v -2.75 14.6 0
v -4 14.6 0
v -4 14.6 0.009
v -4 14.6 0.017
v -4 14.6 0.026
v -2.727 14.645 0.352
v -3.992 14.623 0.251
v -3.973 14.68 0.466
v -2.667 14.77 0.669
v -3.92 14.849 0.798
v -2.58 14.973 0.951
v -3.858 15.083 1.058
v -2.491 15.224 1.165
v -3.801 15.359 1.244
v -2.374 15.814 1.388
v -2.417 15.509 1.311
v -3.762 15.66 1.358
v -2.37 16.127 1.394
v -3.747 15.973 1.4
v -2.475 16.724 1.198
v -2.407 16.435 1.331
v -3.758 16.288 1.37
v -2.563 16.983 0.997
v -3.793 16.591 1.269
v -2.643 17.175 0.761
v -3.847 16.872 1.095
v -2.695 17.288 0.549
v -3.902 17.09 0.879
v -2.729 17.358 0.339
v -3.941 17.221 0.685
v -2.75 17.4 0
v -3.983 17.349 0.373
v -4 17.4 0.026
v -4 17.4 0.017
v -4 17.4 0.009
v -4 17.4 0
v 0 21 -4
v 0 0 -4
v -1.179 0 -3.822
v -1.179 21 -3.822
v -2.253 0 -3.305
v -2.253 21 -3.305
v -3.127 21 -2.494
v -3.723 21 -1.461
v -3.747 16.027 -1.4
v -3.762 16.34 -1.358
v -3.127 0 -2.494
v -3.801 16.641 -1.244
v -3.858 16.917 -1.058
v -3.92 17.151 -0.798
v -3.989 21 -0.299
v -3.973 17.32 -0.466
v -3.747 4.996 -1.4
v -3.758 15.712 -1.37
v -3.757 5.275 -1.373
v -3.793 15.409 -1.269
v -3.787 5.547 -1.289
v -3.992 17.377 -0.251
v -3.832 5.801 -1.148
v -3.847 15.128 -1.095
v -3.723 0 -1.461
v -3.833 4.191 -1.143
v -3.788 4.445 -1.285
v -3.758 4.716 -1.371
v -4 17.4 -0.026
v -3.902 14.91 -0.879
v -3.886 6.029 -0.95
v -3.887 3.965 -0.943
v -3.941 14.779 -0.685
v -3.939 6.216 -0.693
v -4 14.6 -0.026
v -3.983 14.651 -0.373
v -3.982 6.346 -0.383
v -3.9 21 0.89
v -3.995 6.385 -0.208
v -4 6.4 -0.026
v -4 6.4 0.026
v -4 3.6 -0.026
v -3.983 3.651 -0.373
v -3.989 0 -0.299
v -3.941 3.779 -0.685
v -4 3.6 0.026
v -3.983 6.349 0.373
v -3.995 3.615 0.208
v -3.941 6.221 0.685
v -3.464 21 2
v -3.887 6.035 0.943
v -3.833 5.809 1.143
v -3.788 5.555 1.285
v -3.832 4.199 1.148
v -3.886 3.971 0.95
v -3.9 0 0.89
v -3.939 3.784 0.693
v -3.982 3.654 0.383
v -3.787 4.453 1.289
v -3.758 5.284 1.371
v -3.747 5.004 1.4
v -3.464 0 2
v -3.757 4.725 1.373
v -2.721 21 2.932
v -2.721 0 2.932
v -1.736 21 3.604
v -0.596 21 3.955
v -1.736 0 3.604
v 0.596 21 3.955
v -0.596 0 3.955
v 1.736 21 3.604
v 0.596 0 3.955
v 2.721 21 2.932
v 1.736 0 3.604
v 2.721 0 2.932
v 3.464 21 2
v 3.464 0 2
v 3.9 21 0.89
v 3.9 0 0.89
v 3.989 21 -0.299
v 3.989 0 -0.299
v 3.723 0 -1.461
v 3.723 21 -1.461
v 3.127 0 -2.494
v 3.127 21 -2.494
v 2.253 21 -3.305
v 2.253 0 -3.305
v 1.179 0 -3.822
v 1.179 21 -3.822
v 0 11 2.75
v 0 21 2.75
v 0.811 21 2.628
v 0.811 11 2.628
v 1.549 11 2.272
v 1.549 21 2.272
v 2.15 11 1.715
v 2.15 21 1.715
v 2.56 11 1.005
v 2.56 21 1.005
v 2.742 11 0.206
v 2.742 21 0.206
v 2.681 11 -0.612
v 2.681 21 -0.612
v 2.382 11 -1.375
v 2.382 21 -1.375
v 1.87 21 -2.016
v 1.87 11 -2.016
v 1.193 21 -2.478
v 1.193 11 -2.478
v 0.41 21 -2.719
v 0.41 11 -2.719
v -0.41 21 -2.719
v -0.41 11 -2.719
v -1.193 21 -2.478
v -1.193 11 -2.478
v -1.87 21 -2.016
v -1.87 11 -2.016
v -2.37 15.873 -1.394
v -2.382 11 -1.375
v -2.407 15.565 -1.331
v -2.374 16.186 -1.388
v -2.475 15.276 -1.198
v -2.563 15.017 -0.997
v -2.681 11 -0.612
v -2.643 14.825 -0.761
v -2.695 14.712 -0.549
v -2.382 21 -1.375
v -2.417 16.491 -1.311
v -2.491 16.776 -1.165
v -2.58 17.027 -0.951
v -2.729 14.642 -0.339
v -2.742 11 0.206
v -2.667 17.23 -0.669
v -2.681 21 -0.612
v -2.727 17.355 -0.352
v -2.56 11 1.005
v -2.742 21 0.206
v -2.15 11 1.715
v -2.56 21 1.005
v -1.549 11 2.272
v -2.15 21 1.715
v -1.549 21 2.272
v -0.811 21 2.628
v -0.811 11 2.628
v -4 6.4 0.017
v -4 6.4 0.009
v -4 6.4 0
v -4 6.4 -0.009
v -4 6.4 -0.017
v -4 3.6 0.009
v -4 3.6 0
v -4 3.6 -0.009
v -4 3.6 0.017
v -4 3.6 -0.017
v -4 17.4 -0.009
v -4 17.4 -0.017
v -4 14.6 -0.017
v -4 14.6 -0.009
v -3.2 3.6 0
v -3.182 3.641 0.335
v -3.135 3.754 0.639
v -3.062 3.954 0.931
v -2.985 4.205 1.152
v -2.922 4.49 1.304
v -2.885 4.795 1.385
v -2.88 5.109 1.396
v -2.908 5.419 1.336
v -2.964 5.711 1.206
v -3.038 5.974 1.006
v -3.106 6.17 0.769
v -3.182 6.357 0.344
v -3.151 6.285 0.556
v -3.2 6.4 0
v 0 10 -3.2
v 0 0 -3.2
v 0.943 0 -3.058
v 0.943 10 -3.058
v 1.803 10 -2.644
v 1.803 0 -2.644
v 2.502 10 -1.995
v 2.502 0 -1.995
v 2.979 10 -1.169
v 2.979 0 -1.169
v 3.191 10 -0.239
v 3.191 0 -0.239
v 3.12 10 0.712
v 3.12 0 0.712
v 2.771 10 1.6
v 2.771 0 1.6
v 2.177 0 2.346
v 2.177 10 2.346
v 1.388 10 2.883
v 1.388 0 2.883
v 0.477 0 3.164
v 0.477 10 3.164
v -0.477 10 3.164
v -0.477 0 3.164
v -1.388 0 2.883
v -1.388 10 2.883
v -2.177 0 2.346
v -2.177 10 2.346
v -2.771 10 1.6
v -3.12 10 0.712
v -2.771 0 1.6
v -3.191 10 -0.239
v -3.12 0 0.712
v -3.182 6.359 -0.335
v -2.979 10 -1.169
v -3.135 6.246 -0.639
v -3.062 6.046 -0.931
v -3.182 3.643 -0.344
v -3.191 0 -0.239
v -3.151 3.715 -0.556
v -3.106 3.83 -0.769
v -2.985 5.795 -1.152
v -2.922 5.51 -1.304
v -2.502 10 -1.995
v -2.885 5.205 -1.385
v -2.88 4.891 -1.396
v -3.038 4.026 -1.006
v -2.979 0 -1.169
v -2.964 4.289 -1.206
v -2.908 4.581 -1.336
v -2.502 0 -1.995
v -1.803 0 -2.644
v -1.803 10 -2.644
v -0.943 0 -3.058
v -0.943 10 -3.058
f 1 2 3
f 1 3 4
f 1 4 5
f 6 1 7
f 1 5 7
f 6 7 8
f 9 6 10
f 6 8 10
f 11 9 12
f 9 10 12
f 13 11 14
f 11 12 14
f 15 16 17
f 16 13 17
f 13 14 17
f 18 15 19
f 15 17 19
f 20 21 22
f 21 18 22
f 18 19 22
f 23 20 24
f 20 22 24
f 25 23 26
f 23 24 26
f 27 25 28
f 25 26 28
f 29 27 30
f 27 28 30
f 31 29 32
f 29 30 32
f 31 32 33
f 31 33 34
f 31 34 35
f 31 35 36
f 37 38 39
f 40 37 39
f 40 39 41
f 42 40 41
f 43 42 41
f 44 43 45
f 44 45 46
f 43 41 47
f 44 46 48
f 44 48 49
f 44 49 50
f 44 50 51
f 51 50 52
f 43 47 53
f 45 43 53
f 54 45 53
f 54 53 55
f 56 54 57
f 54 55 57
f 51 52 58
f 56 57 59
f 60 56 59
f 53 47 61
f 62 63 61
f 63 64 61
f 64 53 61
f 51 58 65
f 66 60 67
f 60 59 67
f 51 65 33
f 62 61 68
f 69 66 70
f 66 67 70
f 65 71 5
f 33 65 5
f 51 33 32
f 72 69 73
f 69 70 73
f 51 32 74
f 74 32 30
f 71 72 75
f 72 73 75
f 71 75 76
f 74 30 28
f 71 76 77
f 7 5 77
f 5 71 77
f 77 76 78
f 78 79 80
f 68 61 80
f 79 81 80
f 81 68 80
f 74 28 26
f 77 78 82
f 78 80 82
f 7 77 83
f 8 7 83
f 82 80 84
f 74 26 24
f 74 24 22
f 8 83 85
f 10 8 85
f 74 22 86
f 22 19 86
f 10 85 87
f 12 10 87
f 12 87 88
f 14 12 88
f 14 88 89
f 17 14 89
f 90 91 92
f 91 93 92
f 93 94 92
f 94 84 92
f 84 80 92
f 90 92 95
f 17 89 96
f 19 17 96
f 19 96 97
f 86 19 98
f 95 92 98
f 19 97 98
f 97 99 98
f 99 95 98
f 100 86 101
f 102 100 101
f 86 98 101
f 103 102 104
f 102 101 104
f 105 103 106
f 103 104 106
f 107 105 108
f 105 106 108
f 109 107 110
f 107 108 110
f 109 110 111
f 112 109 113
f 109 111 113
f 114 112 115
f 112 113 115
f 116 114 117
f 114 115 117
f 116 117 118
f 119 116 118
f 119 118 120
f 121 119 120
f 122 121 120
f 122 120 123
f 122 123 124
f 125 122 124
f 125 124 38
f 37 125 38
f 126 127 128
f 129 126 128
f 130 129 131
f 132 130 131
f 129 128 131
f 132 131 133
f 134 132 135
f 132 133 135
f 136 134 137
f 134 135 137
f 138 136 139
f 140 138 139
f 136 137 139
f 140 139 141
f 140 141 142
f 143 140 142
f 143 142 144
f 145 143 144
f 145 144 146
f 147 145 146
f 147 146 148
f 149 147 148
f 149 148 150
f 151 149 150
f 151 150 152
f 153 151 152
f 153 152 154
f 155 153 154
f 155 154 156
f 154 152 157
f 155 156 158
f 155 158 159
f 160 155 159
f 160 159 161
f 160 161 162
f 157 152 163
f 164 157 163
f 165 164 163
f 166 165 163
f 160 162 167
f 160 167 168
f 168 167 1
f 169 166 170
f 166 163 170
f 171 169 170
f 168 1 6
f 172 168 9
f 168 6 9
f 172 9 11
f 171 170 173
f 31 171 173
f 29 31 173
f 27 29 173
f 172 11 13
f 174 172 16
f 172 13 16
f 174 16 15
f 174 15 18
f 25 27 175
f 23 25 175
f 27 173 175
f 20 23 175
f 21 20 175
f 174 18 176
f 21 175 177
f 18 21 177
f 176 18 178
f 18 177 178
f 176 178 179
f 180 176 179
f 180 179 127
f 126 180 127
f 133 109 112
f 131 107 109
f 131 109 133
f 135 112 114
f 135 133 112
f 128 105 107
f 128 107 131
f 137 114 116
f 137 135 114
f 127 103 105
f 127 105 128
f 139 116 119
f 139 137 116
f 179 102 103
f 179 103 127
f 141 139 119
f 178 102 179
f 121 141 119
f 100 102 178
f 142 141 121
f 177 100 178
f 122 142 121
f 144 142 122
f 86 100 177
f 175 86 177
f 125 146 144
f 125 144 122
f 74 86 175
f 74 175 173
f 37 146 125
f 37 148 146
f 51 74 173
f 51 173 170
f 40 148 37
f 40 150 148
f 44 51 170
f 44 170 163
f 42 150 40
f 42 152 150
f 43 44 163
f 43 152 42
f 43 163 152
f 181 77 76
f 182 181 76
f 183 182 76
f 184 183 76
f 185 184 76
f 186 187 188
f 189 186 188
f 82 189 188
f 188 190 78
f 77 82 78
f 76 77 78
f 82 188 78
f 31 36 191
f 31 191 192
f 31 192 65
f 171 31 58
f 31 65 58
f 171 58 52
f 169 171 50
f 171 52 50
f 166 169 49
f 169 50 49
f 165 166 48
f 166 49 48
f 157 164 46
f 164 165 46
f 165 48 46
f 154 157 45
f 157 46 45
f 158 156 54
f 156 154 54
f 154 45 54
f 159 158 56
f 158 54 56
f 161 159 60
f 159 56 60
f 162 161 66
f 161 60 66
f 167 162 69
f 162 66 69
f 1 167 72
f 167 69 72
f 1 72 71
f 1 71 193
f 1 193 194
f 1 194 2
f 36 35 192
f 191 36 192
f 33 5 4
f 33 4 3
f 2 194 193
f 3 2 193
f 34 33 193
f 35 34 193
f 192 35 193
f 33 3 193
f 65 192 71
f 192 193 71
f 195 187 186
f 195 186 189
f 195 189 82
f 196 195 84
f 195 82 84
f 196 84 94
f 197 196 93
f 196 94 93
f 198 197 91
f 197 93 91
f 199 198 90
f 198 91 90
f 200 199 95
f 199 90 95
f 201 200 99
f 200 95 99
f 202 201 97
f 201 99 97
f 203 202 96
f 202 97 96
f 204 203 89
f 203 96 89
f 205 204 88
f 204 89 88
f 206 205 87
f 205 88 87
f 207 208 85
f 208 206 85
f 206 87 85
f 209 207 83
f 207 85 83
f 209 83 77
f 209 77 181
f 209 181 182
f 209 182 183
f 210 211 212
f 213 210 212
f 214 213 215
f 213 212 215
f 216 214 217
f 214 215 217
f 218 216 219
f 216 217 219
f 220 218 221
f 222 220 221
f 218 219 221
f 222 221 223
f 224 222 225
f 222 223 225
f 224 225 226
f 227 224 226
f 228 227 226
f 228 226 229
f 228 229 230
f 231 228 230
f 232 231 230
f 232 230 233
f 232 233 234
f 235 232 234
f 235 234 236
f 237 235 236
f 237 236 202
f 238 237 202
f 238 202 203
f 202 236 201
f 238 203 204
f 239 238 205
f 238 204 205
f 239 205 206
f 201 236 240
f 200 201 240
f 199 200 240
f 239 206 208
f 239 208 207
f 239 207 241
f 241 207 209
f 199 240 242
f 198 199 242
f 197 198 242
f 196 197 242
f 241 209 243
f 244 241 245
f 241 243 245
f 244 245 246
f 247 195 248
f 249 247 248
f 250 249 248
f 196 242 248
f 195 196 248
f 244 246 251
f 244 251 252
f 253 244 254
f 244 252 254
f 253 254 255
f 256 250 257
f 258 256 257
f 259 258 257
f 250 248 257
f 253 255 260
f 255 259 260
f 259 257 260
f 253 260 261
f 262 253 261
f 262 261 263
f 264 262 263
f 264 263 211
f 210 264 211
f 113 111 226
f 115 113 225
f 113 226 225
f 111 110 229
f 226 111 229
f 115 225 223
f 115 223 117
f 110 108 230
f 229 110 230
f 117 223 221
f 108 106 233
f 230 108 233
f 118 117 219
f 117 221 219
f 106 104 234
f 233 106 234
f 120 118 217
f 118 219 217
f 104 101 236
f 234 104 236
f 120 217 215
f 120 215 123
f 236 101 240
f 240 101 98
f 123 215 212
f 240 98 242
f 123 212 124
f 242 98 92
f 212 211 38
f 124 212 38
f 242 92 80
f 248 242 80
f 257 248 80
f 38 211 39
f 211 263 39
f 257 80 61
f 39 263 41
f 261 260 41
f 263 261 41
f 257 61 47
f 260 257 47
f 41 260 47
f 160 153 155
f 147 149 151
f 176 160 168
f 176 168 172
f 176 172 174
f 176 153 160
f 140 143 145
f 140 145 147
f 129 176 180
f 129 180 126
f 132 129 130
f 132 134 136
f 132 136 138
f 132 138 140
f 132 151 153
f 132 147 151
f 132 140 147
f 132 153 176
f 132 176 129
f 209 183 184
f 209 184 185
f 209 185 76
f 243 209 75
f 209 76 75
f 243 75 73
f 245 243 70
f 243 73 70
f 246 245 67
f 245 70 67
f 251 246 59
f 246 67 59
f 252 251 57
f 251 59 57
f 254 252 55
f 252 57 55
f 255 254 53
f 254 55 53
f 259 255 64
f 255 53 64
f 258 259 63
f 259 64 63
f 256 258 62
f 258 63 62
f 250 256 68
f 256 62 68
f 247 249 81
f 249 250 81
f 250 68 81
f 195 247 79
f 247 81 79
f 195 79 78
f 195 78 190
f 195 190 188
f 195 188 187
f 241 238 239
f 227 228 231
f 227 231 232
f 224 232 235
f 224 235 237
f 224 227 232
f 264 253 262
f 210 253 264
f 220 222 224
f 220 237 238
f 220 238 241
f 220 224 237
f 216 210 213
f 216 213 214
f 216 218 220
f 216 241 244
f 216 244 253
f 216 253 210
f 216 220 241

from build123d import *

# Parameters (mm, degrees)
SKETCH1_R           = 4
BOSS_EXTRUDE1_DEPTH = 21
SKETCH2_R           = 3.2
CUT_EXTRUDE1_DEPTH  = 10
SKETCH3_R           = 2.75
CUT_EXTRUDE3_DEPTH  = 10


with BuildPart() as part:
    # Sketch1 → Boss-Extrude1 (new body)
    with BuildSketch(Plane(origin=(0, 0, 0), x_dir=(1, 0, 0), z_dir=(0, 1, 0))):
        with Locations(Location((0, 0, 0), (0, 0, 90))):
            Circle(SKETCH1_R)
    extrude(amount=BOSS_EXTRUDE1_DEPTH)

    # Sketch2 → Cut-Extrude1 (cut)
    with BuildSketch(Plane.XZ):
        with Locations(Location((0, 0, 0), (0, 0, 270))):
            Circle(SKETCH2_R)
    extrude(amount=-CUT_EXTRUDE1_DEPTH, mode=Mode.SUBTRACT)

    # Sketch3 → Cut-Extrude3 (cut)
    with BuildSketch(Plane(origin=(0, 21, 0), x_dir=(1, 0, 0), z_dir=(0, 1, 0))):
        with Locations(Location((0, 0, 0), (0, 0, 270))):
            Circle(SKETCH3_R)
    extrude(amount=-CUT_EXTRUDE3_DEPTH, mode=Mode.SUBTRACT)

    # Cut-Extrude5: read off the stored shape, not the designer's step
    # Cut-Extrude5: loft between two sections, ruled curve by curve
    cut_extrude5_from = [
        Edge.make_three_point_arc((-2.36677924, 14.6, 0), (-2.36677924, 16, 1.4), (-2.36677924, 17.4, 0)),
        Edge.make_three_point_arc((-2.36677924, 17.4, 0), (-2.36677924, 16, -1.4), (-2.36677924, 14.6, 0)),
    ]
    cut_extrude5_to = [
        Edge.make_three_point_arc((-3.999916451, 14.6, 0), (-3.999916451, 16, 1.4), (-3.999916451, 17.4, 0)),
        Edge.make_three_point_arc((-3.999916451, 17.4, 0), (-3.999916451, 16, -1.4), (-3.999916451, 14.6, 0)),
    ]
    cut_extrude5 = Solid(Shell([*[Face.make_surface_from_curves(cut_extrude5_from[k], cut_extrude5_to[k]) for k in range(2)], Face(Wire(cut_extrude5_from)), Face(Wire(cut_extrude5_to))]))
    add(cut_extrude5, mode=Mode.SUBTRACT)

    # Cut-Extrude5 2: loft between two sections, ruled curve by curve
    cut_extrude5_2_from = [
        Edge.make_three_point_arc((-2.877351837, 3.6, 0), (-2.877351837, 5, 1.4), (-2.877351837, 6.4, 0)),
        Edge.make_three_point_arc((-2.877351837, 6.4, 0), (-2.877351837, 5, -1.4), (-2.877351837, 3.6, 0)),
    ]
    cut_extrude5_2_to = [
        Edge.make_three_point_arc((-3.999916451, 3.6, 0), (-3.999916451, 5, 1.4), (-3.999916451, 6.4, 0)),
        Edge.make_three_point_arc((-3.999916451, 6.4, 0), (-3.999916451, 5, -1.4), (-3.999916451, 3.6, 0)),
    ]
    cut_extrude5_2 = Solid(Shell([*[Face.make_surface_from_curves(cut_extrude5_2_from[k], cut_extrude5_2_to[k]) for k in range(2)], Face(Wire(cut_extrude5_2_from)), Face(Wire(cut_extrude5_2_to))]))
    add(cut_extrude5_2, mode=Mode.SUBTRACT)


solid = part.part
